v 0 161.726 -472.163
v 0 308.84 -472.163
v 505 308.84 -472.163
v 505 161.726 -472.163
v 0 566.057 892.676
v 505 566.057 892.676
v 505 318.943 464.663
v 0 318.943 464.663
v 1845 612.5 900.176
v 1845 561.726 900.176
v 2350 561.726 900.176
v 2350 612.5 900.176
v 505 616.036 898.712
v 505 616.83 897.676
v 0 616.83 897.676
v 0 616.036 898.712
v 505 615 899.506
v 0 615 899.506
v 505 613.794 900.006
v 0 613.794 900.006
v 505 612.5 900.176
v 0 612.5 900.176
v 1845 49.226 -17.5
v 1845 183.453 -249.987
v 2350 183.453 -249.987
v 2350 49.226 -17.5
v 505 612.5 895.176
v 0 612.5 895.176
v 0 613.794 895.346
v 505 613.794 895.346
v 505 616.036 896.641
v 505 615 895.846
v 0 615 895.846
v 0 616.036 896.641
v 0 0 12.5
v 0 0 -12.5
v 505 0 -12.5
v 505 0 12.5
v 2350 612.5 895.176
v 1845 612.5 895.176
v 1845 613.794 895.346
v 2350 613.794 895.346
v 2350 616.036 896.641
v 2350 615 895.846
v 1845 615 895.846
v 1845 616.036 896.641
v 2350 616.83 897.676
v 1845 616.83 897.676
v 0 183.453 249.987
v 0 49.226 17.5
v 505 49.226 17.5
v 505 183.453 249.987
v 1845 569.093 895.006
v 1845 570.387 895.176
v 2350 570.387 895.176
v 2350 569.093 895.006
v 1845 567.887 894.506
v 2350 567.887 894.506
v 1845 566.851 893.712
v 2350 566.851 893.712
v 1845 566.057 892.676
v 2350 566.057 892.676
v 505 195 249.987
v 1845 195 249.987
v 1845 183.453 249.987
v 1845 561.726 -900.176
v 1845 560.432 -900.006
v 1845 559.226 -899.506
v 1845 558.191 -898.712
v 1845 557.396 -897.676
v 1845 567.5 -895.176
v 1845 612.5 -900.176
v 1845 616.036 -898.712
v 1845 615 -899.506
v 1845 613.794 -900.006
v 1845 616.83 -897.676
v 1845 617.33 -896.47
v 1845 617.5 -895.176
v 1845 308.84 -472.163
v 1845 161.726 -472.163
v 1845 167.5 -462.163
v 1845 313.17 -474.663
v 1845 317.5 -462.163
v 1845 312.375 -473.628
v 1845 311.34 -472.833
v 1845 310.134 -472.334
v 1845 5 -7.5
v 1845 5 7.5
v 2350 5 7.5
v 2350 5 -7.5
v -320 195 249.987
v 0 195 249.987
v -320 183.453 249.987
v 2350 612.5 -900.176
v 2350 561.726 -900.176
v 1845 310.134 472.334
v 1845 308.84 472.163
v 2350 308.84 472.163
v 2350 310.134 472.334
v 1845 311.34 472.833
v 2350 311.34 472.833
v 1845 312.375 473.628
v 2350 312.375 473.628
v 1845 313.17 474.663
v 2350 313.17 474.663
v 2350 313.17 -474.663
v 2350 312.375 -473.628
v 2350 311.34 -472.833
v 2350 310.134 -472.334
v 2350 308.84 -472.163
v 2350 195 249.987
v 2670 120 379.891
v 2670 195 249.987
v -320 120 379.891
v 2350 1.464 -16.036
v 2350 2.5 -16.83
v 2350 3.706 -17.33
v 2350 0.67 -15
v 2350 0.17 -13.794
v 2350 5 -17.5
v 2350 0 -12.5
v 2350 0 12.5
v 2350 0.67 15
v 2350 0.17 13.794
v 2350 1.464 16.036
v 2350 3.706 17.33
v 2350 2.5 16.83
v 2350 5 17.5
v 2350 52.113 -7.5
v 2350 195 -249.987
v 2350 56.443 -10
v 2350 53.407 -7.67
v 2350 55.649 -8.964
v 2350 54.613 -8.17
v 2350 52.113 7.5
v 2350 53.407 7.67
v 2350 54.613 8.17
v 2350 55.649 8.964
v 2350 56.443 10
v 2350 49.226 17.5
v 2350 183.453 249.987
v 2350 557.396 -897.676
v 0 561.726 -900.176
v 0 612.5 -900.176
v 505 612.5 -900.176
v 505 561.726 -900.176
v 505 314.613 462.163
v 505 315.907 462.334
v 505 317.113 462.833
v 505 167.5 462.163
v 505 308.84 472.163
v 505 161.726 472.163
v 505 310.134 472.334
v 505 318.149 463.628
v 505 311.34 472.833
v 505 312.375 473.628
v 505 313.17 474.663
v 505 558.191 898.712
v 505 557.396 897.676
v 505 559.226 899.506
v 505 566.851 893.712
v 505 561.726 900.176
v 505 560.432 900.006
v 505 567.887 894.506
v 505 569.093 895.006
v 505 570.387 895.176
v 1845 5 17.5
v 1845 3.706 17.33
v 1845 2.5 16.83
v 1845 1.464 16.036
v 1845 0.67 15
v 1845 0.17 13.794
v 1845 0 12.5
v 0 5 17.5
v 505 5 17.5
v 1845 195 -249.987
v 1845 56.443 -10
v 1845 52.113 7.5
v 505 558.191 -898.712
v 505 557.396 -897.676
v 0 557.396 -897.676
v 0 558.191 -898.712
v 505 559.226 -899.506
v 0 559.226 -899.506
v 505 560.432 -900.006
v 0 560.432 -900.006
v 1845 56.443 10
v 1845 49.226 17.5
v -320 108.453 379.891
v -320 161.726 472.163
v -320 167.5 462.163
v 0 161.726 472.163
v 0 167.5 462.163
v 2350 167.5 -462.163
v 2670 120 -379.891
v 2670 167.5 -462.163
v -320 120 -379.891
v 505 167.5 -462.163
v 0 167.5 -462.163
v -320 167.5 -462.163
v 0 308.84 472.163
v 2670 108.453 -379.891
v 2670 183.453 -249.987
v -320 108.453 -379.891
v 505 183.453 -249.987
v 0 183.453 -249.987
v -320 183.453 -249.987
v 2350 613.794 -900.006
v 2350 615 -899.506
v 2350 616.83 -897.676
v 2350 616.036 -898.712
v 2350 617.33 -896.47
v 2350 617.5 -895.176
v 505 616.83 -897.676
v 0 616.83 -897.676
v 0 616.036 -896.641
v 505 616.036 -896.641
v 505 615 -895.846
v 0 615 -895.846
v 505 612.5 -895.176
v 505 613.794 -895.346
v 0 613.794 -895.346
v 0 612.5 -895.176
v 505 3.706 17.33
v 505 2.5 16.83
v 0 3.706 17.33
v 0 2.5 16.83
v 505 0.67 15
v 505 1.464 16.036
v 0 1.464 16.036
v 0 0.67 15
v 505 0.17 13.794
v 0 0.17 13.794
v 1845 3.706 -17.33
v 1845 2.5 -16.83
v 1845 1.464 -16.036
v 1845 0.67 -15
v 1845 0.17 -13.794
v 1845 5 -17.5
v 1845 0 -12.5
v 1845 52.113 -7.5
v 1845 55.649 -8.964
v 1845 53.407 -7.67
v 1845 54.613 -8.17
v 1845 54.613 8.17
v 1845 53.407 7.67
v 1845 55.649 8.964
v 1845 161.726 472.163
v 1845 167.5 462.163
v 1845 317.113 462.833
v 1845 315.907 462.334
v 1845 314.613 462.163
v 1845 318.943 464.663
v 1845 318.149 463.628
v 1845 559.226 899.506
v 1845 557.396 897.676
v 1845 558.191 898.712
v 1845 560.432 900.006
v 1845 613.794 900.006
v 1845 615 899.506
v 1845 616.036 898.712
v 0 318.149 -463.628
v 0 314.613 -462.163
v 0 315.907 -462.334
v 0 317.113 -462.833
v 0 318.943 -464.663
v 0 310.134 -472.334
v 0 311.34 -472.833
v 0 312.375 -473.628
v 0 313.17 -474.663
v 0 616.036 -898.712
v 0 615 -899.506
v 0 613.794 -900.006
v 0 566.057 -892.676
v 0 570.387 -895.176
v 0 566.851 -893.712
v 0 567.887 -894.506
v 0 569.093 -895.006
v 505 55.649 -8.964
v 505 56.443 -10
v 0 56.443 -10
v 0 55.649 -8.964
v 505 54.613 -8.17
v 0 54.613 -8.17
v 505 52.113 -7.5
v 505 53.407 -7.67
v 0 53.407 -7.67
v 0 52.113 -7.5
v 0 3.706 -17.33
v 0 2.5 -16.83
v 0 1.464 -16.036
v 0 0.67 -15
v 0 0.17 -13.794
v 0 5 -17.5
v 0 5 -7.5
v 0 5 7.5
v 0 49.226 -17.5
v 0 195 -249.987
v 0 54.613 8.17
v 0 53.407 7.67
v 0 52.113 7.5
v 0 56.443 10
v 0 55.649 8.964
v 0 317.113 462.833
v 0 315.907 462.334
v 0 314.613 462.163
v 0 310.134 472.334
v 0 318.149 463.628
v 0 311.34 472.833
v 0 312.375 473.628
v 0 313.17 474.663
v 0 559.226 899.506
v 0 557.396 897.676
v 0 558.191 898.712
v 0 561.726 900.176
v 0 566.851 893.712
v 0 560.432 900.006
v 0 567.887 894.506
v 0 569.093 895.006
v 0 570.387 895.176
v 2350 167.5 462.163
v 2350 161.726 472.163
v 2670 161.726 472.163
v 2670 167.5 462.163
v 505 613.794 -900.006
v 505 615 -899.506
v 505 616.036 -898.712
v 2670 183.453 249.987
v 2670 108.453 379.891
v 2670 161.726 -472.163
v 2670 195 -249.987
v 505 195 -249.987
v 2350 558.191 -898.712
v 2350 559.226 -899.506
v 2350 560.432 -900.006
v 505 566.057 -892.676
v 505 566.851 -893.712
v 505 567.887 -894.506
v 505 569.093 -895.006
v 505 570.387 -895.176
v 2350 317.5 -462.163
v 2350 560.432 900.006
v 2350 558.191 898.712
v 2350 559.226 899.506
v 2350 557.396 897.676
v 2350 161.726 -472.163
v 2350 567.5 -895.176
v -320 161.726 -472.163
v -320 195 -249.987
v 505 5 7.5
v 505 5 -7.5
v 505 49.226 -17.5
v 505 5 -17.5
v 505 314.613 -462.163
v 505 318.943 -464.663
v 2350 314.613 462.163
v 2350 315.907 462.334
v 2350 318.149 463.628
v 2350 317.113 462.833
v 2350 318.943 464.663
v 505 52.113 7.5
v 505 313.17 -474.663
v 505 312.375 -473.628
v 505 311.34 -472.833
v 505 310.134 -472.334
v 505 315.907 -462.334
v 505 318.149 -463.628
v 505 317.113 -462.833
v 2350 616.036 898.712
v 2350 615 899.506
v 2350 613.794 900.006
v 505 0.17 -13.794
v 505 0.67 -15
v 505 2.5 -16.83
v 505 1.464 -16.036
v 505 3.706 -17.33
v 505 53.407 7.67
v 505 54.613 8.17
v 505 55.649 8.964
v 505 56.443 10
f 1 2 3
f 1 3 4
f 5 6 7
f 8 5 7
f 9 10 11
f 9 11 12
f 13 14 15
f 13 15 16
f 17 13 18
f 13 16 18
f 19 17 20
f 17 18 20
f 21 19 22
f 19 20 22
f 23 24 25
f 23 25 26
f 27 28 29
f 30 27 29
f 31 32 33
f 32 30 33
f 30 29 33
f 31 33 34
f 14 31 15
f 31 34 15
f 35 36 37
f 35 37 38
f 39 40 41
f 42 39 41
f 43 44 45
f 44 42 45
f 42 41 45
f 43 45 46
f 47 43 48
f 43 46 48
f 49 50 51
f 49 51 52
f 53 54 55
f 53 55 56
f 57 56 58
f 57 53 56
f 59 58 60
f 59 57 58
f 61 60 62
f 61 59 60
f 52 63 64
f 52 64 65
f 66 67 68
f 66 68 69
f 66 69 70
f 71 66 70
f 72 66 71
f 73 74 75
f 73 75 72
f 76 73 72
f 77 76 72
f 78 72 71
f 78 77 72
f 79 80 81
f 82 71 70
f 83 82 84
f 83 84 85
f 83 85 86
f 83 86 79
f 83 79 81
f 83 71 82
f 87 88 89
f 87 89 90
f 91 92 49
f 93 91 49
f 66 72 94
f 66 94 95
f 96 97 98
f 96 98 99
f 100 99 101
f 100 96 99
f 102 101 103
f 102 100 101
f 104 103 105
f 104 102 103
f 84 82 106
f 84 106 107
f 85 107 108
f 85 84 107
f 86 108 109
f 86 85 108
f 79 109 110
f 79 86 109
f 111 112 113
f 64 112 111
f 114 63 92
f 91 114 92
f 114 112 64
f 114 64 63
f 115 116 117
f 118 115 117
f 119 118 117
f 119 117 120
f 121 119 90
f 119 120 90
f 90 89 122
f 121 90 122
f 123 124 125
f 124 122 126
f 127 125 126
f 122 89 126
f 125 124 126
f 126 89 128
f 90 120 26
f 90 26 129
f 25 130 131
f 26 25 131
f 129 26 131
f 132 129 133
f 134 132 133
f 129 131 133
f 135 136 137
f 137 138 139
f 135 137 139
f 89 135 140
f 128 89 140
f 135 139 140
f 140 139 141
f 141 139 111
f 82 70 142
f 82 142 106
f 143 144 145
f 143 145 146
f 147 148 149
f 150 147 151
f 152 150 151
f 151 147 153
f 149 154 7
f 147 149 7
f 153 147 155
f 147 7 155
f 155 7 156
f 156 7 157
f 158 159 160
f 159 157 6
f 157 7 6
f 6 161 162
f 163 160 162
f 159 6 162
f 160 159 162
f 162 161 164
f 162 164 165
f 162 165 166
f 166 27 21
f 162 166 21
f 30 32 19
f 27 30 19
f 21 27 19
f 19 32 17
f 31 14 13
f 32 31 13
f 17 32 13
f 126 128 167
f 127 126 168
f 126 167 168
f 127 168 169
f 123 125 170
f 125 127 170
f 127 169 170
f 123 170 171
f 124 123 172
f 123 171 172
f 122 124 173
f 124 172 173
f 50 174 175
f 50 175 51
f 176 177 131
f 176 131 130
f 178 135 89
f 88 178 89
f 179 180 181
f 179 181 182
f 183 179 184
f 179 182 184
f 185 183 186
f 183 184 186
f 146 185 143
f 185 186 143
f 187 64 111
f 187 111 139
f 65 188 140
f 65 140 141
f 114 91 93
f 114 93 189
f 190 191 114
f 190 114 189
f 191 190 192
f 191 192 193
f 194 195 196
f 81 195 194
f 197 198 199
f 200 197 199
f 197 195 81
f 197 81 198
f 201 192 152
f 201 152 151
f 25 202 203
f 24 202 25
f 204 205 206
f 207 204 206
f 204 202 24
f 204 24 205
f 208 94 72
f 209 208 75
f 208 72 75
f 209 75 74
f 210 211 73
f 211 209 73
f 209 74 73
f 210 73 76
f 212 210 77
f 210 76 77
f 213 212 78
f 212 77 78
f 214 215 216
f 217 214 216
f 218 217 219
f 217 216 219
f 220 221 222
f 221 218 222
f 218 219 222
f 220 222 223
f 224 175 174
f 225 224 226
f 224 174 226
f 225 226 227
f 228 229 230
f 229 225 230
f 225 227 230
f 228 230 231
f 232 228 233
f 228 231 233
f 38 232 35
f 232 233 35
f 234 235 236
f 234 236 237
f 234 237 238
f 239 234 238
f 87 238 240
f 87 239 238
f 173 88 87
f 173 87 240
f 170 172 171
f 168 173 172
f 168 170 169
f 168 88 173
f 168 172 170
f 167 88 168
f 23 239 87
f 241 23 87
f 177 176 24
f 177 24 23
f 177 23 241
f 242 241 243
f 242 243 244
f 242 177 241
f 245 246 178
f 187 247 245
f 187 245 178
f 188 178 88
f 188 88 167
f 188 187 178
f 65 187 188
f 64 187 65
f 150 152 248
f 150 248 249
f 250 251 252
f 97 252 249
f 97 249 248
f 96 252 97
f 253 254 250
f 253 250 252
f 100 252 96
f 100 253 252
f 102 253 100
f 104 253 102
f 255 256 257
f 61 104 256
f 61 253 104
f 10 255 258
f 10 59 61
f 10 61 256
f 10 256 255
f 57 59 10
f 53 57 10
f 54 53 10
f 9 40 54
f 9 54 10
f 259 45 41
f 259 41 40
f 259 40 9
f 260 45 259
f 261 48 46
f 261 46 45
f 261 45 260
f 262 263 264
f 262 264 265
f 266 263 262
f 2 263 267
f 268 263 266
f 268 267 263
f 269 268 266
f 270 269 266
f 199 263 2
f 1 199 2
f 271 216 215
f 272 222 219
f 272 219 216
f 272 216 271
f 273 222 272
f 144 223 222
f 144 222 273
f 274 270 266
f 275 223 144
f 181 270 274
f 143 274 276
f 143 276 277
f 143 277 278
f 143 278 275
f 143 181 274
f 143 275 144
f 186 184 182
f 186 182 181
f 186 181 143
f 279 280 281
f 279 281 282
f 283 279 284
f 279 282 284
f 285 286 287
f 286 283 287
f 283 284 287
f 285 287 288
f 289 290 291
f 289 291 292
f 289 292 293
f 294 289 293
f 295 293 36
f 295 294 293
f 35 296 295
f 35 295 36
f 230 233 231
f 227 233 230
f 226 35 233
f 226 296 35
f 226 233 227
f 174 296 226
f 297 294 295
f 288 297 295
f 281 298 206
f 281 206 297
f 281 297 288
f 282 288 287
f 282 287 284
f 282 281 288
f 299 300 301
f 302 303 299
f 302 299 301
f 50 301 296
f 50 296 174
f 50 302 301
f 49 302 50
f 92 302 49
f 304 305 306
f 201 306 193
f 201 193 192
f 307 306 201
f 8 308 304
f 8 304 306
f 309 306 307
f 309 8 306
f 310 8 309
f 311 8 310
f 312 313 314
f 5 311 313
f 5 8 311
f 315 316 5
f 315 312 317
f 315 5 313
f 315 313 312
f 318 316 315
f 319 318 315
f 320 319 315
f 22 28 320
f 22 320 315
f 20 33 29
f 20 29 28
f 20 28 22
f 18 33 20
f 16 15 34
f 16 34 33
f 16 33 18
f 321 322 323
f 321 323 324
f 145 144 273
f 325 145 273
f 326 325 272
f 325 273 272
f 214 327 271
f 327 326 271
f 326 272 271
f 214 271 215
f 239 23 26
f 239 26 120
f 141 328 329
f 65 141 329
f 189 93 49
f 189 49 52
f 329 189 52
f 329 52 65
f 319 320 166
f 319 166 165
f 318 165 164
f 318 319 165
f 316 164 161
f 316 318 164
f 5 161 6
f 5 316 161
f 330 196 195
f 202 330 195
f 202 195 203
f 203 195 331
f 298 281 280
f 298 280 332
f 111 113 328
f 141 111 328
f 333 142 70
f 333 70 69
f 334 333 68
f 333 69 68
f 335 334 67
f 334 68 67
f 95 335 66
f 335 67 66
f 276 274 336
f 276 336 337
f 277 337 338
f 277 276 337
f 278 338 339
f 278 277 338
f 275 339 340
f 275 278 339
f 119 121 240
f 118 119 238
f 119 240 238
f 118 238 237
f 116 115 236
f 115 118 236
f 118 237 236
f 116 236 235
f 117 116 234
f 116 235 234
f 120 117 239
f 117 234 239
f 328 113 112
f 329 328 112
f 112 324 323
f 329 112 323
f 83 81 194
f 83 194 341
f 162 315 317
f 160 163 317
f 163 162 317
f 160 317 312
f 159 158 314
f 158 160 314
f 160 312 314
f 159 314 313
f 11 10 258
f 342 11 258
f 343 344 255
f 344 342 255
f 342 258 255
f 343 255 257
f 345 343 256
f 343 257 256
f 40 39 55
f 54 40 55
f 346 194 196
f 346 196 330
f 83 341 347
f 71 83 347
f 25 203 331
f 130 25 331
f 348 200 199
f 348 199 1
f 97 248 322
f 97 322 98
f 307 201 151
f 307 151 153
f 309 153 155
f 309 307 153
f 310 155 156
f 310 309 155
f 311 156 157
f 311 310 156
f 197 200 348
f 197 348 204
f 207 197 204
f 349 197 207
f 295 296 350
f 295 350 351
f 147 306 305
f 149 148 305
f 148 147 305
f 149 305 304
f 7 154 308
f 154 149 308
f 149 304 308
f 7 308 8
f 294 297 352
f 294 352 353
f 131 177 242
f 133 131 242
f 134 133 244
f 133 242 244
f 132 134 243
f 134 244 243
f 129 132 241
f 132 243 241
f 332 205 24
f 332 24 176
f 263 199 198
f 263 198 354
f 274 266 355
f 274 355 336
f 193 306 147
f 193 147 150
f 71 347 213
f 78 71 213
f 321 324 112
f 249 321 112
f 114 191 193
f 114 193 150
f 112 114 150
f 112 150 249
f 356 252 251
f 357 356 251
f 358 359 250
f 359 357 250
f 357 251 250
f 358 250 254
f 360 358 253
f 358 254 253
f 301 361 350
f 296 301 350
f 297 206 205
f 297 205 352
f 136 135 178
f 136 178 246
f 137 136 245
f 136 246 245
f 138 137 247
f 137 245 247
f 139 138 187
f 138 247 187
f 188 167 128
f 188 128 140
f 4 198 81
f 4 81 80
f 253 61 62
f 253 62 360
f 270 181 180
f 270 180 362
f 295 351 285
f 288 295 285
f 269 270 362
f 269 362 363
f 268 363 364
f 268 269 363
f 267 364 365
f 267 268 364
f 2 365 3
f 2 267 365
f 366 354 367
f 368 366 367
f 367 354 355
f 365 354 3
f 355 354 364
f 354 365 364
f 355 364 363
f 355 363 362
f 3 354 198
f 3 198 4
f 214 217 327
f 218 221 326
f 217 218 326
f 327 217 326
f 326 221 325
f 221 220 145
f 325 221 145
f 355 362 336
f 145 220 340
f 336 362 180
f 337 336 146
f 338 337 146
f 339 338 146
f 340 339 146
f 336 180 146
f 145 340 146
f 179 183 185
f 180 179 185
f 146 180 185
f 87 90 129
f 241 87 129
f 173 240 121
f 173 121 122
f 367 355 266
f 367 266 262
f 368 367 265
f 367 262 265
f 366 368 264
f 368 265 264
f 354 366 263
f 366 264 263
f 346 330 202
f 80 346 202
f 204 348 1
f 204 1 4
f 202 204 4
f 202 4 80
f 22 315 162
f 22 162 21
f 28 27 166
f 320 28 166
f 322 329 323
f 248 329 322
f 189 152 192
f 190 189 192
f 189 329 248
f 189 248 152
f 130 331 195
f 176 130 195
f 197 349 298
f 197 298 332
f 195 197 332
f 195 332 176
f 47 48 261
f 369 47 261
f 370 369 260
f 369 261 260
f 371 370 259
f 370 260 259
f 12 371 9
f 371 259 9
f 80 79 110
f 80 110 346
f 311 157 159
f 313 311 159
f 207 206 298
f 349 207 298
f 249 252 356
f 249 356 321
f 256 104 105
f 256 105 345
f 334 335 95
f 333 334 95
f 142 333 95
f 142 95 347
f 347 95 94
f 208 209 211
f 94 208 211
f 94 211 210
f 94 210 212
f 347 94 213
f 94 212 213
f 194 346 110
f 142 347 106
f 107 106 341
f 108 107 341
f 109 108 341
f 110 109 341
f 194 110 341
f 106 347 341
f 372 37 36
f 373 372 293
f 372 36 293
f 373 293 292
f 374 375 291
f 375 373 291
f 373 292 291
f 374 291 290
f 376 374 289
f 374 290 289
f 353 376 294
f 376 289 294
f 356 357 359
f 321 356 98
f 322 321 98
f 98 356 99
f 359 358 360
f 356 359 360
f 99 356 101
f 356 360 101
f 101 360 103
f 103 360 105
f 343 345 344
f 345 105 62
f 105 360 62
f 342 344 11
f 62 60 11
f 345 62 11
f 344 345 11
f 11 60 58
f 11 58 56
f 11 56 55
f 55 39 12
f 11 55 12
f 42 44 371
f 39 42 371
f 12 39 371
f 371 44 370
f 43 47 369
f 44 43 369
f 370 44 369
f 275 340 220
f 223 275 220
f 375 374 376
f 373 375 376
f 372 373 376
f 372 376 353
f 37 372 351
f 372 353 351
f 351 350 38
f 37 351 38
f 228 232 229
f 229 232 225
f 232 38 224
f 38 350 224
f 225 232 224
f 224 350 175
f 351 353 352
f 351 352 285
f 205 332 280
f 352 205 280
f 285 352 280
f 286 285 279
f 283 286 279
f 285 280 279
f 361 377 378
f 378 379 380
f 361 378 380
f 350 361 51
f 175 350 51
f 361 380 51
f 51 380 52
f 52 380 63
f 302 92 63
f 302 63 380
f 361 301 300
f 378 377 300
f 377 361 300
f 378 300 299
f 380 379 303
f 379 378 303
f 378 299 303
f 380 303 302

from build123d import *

# Parameters (mm, degrees)
BOSS_EXTRUDE1_DEPTH      = 505
BOSS_EXTRUDE3_DEPTH      = 1340
BOSS_EXTRUDE3_DEPTH_BACK = 825
BOSS_EXTRUDE4_DEPTH      = 505
BOSS_EXTRUDE5_DEPTH      = 320
FILLET1_R                = 5


with BuildPart() as part:
    # Sketch1 → Boss-Extrude1 (new body)
    with BuildSketch(Plane(origin=(0, 0, 0), x_dir=(0, 0, -1), z_dir=(1, 0, 0))):
        Polygon((-7.5, 5), (7.5, 5), (7.5, 55), (249.98711306, 195), (379.890923627, 120), (462.163336987, 167.5), (462.163336987, 317.5), (895.176038879, 567.5), (895.176038879, 617.5), (900.176038879, 617.5), (900.176038879, 558.839745962), (472.163336987, 311.726497308), (472.163336987, 161.726497308), (379.890923627, 108.452994616), (249.98711306, 183.452994616), (17.5, 49.226497308), (17.5, 0), (-17.5, 0), (-17.5, 49.226497308), (-249.98711306, 183.452994616), (-379.890923627, 108.452994616), (-472.163336987, 161.726497308), (-472.163336987, 311.726497308), (-900.176038879, 558.839745962), (-900.176038879, 617.5), (-895.176038879, 617.5), (-895.176038879, 567.5), (-462.163336987, 317.5), (-462.163336987, 167.5), (-379.890923627, 120), (-249.98711306, 195), (-7.5, 55), align=None)
    extrude(amount=BOSS_EXTRUDE1_DEPTH)

    # Sketch2 → Boss-Extrude3 (add, two sides: drawn at the far end of the back side and taken through both)
    with BuildSketch(Plane(origin=(505, 0, 0), x_dir=(0, 0, -1), z_dir=(1, 0, 0)).offset(-BOSS_EXTRUDE3_DEPTH_BACK)):
        Polygon((249.98711306, 195), (379.890923627, 120), (462.163336987, 167.5), (472.163336987, 161.726497308), (379.890923627, 108.452994616), (249.98711306, 183.452994616), align=None)
        Polygon((-462.163336987, 167.5), (-379.890923627, 120), (-249.98711306, 195), (-249.98711306, 183.452994616), (-379.890923627, 108.452994616), (-472.163336987, 161.726497308), align=None)
    extrude(amount=BOSS_EXTRUDE3_DEPTH + BOSS_EXTRUDE3_DEPTH_BACK)

    # Sketch4 → Boss-Extrude4 (add)
    with BuildSketch(Plane(origin=(1845, 0, 0), x_dir=(0, 0, -1), z_dir=(1, 0, 0))):
        Polygon((-900.176038879, 617.5), (-895.176038879, 617.5), (-895.176038879, 567.5), (-462.163336987, 317.5), (-462.163336987, 167.5), (-379.890923627, 120), (-249.98711306, 195), (-7.5, 55), (-7.5, 5), (7.5, 5), (7.5, 55), (249.98711306, 195), (379.890923627, 120), (462.163336987, 167.5), (462.163336987, 317.5), (895.176038879, 567.5), (895.176038879, 617.5), (900.176038879, 617.5), (900.176038879, 558.839745962), (472.163336987, 311.726497308), (472.163336987, 161.726497308), (379.890923627, 108.452994616), (249.98711306, 183.452994616), (17.5, 49.226497308), (17.5, 0), (-17.5, 0), (-17.5, 49.226497308), (-249.98711306, 183.452994616), (-379.890923627, 108.452994616), (-472.163336987, 161.726497308), (-472.163336987, 311.726497308), (-900.176038879, 558.839745962), align=None)
    extrude(amount=BOSS_EXTRUDE4_DEPTH)

    # Sketch5 → Boss-Extrude5 (add)
    with BuildSketch(Plane(origin=(2350, 0, 0), x_dir=(0, 0, -1), z_dir=(1, 0, 0))):
        Polygon((249.98711306, 195), (379.890923627, 120), (462.163336987, 167.5), (472.163336987, 161.726497308), (379.890923627, 108.452994616), (249.98711306, 183.452994616), align=None)
        Polygon((-462.163336987, 167.5), (-379.890923627, 120), (-249.98711306, 195), (-249.98711306, 183.452994616), (-379.890923627, 108.452994616), (-472.163336987, 161.726497308), align=None)
    extrude(amount=BOSS_EXTRUDE5_DEPTH)

    # Fillet1
    # the kernel refuses this fillet: 5 mm, written as the material it adds along each edge
    with BuildSketch(Plane(origin=(0, 567.5, -895.176038879), x_dir=(0, -0.4999999999999892, 0.8660254037844449), z_dir=(1, 0, 0)), Plane(origin=(0, 311.726497308, -472.163336987), x_dir=(0, 0.5000000000000101, -0.8660254037844327), z_dir=(1, 0, 0)), Plane(origin=(1845, 311.726497308, -472.163336987), x_dir=(0, 0.4999999999999846, -0.8660254037844476), z_dir=(1, 0, 0)), Plane(origin=(0, 311.726497308, 472.163336987), x_dir=(0, -1, 0), z_dir=(1, 0, 0)), Plane(origin=(1845, 311.726497308, 472.163336987), x_dir=(0, -1, 0), z_dir=(1, 0, 0)), Plane(origin=(0, 567.5, 895.176038879), x_dir=(0, 1, 0), z_dir=(1, 0, 0)), Plane(origin=(1845, 567.5, 895.176038879), x_dir=(0, 1, 0), z_dir=(1, 0, 0))) as fillet1_piece_1:
        with BuildLine():
            CenterArc((FILLET1_R * 0.57735026919, -FILLET1_R), FILLET1_R, 90, 60)
            Line((-FILLET1_R * 0.288675134595, -FILLET1_R * 0.5), (0, 0))
            Line((0, 0), (FILLET1_R * 0.57735026919, 0))
        make_face()
    extrude(amount=505)
    # the kernel refuses this fillet: 5 mm, written as the material it takes off along each edge
    with BuildSketch(Plane(origin=(-12.5, 617.5, -895.176038879), x_dir=(0, 0, -1), z_dir=(1, 0, 0)), Plane(origin=(-12.5, 617.5, -900.176038879), x_dir=(0, -1, 0), z_dir=(1, 0, 0)), Plane(origin=(1832.5, 617.5, -900.176038879), x_dir=(0, -1, 0), z_dir=(1, 0, 0)), Plane(origin=(-12.5, 617.5, 895.176038879), x_dir=(0, -1, 0), z_dir=(1, 0, 0)), Plane(origin=(-12.5, 617.5, 900.176038879), x_dir=(0, 0, -1), z_dir=(1, 0, 0)), Plane(origin=(1832.5, 617.5, 895.176038879), x_dir=(0, -1, 0), z_dir=(1, 0, 0)), Plane(origin=(-12.5, 0, 17.5), x_dir=(0, 1, 0), z_dir=(1, 0, 0)), Plane(origin=(-12.5, 0, -17.5), x_dir=(0, 0, 1), z_dir=(1, 0, 0)), Plane(origin=(1832.5, 0, -17.5), x_dir=(0, 0, 1), z_dir=(1, 0, 0)), Plane(origin=(1832.5, 0, 17.5), x_dir=(0, 1, 0), z_dir=(1, 0, 0))) as fillet1_2_piece_1:
        with BuildLine():
            CenterArc((FILLET1_R, -FILLET1_R), FILLET1_R, 90, 90)
            Line((0, -FILLET1_R), (0, 0))
            Line((0, 0), (FILLET1_R, 0))
        make_face()
    extrude(amount=530, mode=Mode.SUBTRACT)
    with BuildSketch(Plane(origin=(-7.216878365, 317.5, -462.163336987), x_dir=(0, -1, 0), z_dir=(1, 0, 0)), Plane(origin=(-7.216878365, 55, -7.5), x_dir=(0, -1, 0), z_dir=(1, 0, 0)), Plane(origin=(1837.783121635, 55, 7.5), x_dir=(0, 0.49999999999999023, 0.8660254037844441), z_dir=(1, 0, 0))) as fillet1_2_piece_2:
        with BuildLine():
            CenterArc((FILLET1_R * 0.57735026919, FILLET1_R), FILLET1_R, 210, 60)
            Line((-FILLET1_R * 0.288675134595, FILLET1_R * 0.5), (0, 0))
            Line((0, 0), (FILLET1_R * 0.57735026919, 0))
        make_face()
    extrude(amount=519.43375673, mode=Mode.SUBTRACT)
    with BuildSketch(Plane(origin=(-7.216878365, 558.839745962, -900.176038879), x_dir=(0, -0.5000000000000017, 0.8660254037844376), z_dir=(1, 0, 0)), Plane(origin=(1837.783121635, 558.839745962, -900.176038879), x_dir=(0, -0.5000000000000017, 0.8660254037844376), z_dir=(1, 0, 0)), Plane(origin=(1837.783121635, 317.5, 462.163336987), x_dir=(0, -1, 0), z_dir=(1, 0, 0)), Plane(origin=(-7.216878365, 317.5, 462.163336987), x_dir=(0, -1, 0), z_dir=(1, 0, 0)), Plane(origin=(-7.216878365, 558.839745962, 900.176038879), x_dir=(0, 1, 0), z_dir=(1, 0, 0)), Plane(origin=(1837.783121635, 558.839745962, 900.176038879), x_dir=(0, 1, 0), z_dir=(1, 0, 0)), Plane(origin=(-7.216878365, 55, 7.5), x_dir=(0, -1, 0), z_dir=(1, 0, 0)), Plane(origin=(1837.783121635, 55, -7.5), x_dir=(0, 0.49999999999999056, -0.8660254037844441), z_dir=(1, 0, 0))) as fillet1_2_piece_3:
        with BuildLine():
            CenterArc((FILLET1_R * 0.57735026919, -FILLET1_R), FILLET1_R, 90, 60)
            Line((-FILLET1_R * 0.288675134595, -FILLET1_R * 0.5), (0, 0))
            Line((0, 0), (FILLET1_R * 0.57735026919, 0))
        make_face()
    extrude(amount=519.43375673, mode=Mode.SUBTRACT)
    with BuildSketch(Plane(origin=(1832.5, 617.5, 900.176038879), x_dir=(0, -1, 0), z_dir=(1, 0, 0))) as fillet1_2_piece_4:
        with BuildLine():
            CenterArc((FILLET1_R, FILLET1_R), FILLET1_R, 180, 90)
            Line((0, FILLET1_R), (0, 0))
            Line((0, 0), (FILLET1_R, 0))
        make_face()
    extrude(amount=530, mode=Mode.SUBTRACT)


solid = part.part
